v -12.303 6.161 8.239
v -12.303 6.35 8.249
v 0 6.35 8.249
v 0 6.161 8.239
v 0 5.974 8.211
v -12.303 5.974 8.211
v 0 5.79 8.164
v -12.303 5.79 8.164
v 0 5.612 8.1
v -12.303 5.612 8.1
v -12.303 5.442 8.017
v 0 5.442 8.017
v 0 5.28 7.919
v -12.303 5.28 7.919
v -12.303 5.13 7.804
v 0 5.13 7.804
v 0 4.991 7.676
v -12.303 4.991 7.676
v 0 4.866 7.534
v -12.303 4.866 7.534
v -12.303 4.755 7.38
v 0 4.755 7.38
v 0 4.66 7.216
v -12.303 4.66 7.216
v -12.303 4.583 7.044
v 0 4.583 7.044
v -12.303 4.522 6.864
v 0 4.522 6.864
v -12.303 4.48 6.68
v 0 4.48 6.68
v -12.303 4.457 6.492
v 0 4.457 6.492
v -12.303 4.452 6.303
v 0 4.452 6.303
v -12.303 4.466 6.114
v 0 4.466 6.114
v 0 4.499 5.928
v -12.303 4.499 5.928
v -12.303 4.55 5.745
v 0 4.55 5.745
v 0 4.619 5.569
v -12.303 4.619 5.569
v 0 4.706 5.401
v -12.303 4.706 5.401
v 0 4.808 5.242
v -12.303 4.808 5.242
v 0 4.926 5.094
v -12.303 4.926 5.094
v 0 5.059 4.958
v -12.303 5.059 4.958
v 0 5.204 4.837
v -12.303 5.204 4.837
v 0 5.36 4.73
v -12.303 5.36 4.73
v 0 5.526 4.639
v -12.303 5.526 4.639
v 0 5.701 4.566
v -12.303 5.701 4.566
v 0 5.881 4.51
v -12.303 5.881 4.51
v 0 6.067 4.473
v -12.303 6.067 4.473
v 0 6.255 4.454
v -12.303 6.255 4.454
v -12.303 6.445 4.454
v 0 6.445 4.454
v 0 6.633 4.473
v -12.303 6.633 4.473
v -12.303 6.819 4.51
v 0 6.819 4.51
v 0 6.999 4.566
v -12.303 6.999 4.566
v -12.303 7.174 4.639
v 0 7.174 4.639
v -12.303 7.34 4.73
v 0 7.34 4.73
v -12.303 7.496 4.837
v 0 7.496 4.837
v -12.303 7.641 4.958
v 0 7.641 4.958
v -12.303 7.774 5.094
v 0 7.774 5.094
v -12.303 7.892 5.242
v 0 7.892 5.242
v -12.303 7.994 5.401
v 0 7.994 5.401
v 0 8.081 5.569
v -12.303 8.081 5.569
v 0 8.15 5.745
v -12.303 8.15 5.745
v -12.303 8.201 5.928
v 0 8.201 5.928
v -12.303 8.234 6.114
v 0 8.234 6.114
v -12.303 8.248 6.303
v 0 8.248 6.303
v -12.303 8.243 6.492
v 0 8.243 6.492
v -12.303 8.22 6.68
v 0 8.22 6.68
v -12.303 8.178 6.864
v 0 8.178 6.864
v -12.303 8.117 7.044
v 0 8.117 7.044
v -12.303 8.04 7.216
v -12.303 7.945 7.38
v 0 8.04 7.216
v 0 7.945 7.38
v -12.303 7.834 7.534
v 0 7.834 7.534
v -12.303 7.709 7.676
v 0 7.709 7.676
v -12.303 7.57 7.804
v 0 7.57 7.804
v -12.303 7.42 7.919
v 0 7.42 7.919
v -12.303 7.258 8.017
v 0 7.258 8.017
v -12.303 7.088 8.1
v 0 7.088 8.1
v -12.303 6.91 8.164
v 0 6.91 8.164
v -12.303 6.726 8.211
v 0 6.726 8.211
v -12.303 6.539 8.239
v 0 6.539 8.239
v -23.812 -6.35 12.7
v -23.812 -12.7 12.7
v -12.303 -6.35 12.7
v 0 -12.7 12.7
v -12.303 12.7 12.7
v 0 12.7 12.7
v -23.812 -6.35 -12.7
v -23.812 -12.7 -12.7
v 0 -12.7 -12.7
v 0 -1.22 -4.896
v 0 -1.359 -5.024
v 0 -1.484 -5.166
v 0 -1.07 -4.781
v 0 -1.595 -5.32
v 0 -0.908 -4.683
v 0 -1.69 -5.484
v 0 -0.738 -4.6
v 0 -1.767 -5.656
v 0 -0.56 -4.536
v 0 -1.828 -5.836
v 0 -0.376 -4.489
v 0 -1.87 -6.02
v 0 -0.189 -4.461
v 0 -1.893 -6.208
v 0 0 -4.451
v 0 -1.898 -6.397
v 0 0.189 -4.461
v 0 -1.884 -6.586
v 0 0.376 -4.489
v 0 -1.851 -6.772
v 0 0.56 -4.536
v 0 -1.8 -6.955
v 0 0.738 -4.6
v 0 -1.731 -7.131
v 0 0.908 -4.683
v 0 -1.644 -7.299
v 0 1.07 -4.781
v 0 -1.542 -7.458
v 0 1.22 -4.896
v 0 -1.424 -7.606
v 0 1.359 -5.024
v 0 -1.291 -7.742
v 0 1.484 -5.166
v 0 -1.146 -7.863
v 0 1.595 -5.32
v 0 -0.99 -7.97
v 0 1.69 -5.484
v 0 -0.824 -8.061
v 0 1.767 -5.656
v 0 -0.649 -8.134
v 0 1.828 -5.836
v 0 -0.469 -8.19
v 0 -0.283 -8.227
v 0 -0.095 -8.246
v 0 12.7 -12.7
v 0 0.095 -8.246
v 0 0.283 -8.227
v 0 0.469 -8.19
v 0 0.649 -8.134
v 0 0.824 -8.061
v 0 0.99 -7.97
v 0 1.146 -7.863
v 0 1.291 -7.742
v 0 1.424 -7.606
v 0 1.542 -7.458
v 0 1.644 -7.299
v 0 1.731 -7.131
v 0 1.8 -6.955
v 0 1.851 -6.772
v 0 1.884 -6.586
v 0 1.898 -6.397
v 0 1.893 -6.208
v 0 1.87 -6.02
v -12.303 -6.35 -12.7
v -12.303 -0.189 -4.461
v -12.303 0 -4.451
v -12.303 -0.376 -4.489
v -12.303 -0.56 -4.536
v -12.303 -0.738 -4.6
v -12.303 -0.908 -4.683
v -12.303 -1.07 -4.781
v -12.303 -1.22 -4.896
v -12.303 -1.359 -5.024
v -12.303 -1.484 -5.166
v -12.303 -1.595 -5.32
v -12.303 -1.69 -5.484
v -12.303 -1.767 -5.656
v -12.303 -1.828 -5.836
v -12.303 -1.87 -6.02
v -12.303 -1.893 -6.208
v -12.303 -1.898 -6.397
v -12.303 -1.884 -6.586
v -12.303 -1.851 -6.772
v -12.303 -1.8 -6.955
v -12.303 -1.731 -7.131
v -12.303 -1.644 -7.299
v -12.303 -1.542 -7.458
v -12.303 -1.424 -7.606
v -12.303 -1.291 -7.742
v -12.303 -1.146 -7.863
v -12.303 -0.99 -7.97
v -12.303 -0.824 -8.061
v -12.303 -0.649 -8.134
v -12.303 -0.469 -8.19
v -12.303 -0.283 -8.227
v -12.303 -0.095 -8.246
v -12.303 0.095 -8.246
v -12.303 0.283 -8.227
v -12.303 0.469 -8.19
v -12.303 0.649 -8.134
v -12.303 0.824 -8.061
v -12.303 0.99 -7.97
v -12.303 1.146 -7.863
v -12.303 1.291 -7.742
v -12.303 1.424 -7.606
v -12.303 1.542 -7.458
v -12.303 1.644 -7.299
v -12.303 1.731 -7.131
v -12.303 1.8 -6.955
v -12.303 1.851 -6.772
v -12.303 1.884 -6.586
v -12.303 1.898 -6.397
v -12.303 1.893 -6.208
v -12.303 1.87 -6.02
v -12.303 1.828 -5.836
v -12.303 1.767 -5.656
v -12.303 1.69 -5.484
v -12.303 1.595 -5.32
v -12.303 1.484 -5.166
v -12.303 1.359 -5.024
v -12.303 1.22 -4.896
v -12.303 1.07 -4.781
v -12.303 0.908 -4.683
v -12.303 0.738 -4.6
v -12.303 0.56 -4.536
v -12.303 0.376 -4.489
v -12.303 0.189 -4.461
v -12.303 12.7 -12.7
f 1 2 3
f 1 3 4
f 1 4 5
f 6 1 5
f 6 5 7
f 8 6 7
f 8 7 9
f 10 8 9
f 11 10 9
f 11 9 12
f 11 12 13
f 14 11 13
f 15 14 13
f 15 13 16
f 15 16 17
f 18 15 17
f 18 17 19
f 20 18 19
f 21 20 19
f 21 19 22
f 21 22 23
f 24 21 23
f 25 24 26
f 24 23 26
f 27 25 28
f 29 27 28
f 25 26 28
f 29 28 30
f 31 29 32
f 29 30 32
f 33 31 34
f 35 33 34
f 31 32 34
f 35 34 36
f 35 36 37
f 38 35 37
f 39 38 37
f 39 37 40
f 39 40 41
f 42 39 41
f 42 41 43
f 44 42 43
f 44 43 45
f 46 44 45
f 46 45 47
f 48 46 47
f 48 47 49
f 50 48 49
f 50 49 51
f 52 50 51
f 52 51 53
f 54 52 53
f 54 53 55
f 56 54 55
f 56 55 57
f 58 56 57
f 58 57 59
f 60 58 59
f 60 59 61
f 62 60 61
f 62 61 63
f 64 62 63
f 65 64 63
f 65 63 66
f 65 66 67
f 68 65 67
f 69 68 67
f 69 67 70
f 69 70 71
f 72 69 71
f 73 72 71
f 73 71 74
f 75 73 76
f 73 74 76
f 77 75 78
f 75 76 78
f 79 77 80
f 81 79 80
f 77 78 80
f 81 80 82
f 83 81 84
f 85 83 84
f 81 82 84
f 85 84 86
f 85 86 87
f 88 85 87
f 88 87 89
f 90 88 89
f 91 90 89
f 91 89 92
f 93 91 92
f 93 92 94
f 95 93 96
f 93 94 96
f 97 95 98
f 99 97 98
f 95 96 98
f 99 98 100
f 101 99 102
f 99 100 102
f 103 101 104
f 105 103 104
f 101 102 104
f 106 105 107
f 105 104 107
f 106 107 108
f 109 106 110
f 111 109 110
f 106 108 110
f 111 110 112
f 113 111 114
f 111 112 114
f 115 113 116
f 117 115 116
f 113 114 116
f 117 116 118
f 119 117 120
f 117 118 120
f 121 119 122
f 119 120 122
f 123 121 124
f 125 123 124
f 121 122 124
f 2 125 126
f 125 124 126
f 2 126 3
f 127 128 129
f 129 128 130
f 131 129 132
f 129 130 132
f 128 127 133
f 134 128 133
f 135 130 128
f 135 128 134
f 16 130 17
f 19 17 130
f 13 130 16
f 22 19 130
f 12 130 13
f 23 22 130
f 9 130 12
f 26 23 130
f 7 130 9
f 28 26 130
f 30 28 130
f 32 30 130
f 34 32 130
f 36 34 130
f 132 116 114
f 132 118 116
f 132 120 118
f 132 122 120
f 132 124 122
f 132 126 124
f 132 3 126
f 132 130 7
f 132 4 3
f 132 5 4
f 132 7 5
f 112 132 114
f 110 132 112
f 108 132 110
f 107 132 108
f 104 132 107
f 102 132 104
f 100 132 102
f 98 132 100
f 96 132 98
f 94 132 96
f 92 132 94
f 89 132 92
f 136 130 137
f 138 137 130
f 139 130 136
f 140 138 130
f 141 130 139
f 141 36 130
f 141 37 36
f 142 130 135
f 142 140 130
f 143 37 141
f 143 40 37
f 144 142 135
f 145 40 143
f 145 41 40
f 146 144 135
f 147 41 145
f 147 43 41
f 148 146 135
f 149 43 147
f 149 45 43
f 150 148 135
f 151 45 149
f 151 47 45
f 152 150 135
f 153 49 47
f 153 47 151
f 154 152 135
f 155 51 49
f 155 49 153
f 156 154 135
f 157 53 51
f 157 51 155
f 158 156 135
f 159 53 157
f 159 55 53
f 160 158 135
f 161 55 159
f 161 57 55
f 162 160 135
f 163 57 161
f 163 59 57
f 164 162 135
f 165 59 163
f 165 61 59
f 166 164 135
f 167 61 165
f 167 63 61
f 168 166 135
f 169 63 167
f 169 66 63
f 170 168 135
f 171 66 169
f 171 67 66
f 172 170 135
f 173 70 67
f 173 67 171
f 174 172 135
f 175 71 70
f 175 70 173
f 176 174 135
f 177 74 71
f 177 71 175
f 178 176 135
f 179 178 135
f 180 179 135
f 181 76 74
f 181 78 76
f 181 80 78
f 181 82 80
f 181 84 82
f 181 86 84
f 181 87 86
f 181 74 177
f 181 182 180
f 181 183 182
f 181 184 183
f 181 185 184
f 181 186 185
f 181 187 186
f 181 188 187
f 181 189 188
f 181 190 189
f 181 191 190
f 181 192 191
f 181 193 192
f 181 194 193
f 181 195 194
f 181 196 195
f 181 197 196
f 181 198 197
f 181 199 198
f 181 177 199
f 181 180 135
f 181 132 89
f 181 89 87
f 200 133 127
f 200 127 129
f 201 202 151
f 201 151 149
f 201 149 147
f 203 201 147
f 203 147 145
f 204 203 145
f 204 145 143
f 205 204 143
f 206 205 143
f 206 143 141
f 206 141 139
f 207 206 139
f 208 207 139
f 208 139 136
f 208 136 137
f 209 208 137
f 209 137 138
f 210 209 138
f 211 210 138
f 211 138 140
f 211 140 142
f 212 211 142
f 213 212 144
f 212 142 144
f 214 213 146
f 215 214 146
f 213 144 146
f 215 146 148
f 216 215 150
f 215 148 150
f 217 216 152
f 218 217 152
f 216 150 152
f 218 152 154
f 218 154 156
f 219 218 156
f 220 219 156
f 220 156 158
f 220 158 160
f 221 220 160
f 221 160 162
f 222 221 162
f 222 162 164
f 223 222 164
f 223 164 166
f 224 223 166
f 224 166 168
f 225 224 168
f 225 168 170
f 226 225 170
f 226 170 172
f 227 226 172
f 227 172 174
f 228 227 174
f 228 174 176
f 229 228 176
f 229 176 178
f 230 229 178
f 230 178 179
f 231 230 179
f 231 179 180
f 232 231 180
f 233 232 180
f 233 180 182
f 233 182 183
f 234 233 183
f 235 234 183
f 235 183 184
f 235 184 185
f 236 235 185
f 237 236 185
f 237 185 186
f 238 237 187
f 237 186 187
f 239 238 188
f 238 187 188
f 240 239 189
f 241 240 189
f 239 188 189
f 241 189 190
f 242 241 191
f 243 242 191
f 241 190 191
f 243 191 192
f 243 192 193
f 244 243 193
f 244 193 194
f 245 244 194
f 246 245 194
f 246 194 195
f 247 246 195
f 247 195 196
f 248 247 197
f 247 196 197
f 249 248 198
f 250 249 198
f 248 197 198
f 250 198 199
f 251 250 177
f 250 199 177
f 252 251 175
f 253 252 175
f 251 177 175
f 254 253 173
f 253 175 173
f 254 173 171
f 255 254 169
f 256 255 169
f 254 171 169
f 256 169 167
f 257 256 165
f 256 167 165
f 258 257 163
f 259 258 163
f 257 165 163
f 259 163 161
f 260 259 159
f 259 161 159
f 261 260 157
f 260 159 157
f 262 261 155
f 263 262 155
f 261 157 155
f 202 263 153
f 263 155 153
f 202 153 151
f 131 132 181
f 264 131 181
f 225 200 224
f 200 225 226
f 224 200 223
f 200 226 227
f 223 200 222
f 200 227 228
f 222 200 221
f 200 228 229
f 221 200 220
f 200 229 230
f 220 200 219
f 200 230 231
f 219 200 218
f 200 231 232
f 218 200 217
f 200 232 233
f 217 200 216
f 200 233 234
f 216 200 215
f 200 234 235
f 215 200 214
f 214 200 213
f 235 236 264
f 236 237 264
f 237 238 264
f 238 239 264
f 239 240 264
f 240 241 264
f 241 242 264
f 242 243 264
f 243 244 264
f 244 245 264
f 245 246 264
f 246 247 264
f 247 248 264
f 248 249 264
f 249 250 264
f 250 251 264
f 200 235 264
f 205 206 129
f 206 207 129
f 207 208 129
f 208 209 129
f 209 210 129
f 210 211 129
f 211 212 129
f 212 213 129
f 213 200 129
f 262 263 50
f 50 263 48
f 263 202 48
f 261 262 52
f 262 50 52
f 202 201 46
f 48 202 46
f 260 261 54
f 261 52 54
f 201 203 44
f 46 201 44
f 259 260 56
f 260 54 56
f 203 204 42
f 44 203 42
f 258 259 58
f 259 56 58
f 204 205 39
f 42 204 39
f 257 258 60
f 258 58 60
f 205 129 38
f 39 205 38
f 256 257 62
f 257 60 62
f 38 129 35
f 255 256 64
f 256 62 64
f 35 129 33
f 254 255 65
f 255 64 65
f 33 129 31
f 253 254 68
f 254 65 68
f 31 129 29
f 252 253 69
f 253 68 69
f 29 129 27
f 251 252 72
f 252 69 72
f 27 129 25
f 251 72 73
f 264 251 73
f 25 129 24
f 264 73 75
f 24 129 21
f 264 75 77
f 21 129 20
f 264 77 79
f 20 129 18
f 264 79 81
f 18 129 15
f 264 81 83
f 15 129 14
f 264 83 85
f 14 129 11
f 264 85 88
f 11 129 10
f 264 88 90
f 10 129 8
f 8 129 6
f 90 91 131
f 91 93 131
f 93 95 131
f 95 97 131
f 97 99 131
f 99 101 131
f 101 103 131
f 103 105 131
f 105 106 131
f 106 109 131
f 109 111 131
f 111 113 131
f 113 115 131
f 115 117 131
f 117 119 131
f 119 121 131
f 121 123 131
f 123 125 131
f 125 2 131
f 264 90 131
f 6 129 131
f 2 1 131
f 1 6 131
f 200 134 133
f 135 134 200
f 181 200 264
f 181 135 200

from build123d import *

# Parameters (mm, degrees)
SKETCH1_W              = 25.4
SKETCH1_H              = 25.4
EXTRUDE1_DEPTH         = 23.8125
SKETCH2_W              = 11.509375
SKETCH2_H              = 19.05
EXTRUDE2_DEPTH         = 38.060560658
F_10_24_TAPPED_HOLE1_D = 3.7973


with BuildPart() as part:
    # Sketch1 → Extrude1 (new body)
    with BuildSketch(Plane(origin=(0, 0, 0), x_dir=(0, 0, -1), z_dir=(1, 0, 0))):
        Rectangle(SKETCH1_W, SKETCH1_H)
    extrude(amount=-EXTRUDE1_DEPTH)

    # Sketch2 → Extrude2 (cut, through all)
    with BuildSketch(Plane.XY.offset(12.7)):
        with Locations((-18.0578125, 3.175)):
            Rectangle(SKETCH2_W, SKETCH2_H)
    extrude(amount=-EXTRUDE2_DEPTH, mode=Mode.SUBTRACT)

    # #10-24 Tapped Hole1 (through all)
    with Locations(Plane(origin=(-23.8125, 0.158049728, -0.576860853), x_dir=(0, 0, -1), z_dir=(-1, 0, 0))):
        with Locations((5.773139147, 0.158049728), (-6.926860853, -6.191950272)):
            Hole(F_10_24_TAPPED_HOLE1_D / 2)


solid = part.part
